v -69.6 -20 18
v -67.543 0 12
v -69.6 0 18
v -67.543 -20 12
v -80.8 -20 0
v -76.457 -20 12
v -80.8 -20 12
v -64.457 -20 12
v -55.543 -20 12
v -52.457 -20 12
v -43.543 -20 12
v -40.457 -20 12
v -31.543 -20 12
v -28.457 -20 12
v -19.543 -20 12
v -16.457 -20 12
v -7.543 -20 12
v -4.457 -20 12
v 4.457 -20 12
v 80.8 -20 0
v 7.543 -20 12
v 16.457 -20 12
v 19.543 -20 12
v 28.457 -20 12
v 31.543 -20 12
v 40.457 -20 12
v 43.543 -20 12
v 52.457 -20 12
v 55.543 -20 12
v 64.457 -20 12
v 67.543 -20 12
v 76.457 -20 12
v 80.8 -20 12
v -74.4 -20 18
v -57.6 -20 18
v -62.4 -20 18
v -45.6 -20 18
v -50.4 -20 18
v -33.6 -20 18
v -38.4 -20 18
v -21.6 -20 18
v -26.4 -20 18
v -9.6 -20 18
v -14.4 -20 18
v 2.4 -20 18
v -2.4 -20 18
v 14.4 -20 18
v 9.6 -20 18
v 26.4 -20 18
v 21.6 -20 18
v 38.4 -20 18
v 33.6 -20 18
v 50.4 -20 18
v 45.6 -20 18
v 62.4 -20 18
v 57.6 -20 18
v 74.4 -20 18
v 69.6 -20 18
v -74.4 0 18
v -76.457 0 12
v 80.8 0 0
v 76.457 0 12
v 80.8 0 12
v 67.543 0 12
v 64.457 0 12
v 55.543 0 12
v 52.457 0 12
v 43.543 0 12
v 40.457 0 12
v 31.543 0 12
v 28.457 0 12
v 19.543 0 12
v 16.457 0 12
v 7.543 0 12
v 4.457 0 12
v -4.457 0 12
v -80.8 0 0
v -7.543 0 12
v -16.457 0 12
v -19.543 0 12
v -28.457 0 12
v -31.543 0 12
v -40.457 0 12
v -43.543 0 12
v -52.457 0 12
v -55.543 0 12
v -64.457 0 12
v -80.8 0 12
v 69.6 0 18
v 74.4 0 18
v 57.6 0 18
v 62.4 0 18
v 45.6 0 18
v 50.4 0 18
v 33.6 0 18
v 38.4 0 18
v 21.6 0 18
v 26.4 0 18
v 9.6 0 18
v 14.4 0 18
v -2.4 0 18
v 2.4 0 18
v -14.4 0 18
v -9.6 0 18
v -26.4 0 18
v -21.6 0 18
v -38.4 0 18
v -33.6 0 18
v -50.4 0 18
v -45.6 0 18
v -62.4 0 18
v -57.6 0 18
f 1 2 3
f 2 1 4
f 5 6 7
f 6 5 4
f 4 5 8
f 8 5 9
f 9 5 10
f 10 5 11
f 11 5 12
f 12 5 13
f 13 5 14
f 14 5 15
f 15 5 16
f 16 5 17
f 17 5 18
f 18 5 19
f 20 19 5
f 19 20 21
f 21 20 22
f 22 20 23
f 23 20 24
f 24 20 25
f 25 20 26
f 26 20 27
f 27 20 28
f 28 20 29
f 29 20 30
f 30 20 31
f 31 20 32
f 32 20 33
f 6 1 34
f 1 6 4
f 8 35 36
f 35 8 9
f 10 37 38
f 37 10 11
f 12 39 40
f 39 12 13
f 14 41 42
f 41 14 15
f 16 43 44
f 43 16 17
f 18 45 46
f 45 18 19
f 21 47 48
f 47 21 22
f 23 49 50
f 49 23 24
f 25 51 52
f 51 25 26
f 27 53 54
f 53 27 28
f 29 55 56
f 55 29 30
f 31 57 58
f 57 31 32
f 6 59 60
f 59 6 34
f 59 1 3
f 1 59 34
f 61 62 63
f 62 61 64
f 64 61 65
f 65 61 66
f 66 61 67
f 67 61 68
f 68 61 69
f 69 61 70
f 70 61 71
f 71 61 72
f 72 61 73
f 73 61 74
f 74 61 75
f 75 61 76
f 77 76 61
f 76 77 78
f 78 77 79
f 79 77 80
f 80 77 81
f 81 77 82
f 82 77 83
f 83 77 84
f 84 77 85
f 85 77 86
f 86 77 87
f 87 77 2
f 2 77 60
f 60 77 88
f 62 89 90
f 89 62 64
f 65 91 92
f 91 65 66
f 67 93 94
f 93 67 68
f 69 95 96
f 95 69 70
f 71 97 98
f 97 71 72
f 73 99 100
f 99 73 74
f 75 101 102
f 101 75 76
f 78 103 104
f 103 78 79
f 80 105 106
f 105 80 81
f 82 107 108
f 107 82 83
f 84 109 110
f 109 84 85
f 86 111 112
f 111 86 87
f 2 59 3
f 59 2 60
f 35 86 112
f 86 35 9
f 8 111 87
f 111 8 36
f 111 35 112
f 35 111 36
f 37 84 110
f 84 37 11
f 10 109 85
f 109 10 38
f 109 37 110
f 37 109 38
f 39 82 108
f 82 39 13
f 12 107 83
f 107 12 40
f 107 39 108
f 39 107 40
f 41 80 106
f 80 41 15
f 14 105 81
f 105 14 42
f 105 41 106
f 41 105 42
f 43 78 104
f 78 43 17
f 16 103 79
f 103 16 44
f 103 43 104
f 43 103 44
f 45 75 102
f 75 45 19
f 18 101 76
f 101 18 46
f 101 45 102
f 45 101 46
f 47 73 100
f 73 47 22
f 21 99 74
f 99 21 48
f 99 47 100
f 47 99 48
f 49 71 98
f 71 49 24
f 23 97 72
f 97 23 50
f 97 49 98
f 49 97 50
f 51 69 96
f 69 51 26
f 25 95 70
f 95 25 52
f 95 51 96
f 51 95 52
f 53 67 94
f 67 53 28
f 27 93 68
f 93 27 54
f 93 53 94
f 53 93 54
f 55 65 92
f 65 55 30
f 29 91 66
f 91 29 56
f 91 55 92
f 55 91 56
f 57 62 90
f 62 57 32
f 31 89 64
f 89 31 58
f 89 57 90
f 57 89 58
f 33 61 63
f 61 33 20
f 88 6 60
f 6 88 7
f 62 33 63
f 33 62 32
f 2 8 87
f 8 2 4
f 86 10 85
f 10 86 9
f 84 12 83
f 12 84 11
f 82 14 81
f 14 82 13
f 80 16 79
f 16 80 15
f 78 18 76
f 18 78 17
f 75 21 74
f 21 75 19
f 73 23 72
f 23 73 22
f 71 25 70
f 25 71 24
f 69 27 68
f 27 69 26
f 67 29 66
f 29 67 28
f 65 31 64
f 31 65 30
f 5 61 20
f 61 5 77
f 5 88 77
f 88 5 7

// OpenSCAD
$fn = 32;

// ----------------------------------------------------------------------
// Toothed rack, 13 teeth
// 12 mm pitch, 6 mm teeth
// ----------------------------------------------------------------------

// --- parameters (mm) ---
bar_w = 20;     // bar width (Y)
bar_h = 12;     // bar height (Z)
teeth = 13;     // number of teeth
pitch = 12;     // tooth pitch
tooth_h = 6;    // tooth height above the bar
root_w = 9.6;   // tooth width at the root
crest_w = 4.8;  // tooth width at the crest

// --- derived feature positions (mm) ---
span = (teeth - 1) * pitch;  // = 144   distance between the outer teeth
bar_l = span + root_w + 8;   // = 161.6   bar length: teeth plus 4 mm at each end
tooth_x = -span / 2;         // = -72   X of the first tooth
height = bar_h + tooth_h;    // = 18   overall height
feature_centers = [
  [tooth_x + 0 * pitch, -bar_w / 2],
  [tooth_x + 1 * pitch, -bar_w / 2],
  [tooth_x + 2 * pitch, -bar_w / 2],
  [tooth_x + 3 * pitch, -bar_w / 2],
  [tooth_x + 4 * pitch, -bar_w / 2],
  [tooth_x + 5 * pitch, -bar_w / 2],
  [tooth_x + 6 * pitch, -bar_w / 2],
  [tooth_x + 7 * pitch, -bar_w / 2],
  [tooth_x + 8 * pitch, -bar_w / 2],
  [tooth_x + 9 * pitch, -bar_w / 2],
  [tooth_x + 10 * pitch, -bar_w / 2],
  [tooth_x + 11 * pitch, -bar_w / 2],
  [tooth_x + 12 * pitch, -bar_w / 2]
];   // tooth centre line, drives the tooth loop

// bar with a rack of teeth, one extruded trapezoium per centre
module rack_tooth() {
  linear_extrude(height = bar_w)
    polygon(points = [
      [0, 0],
      [root_w, 0],
      [root_w / 2 + crest_w / 2, tooth_h + 1],
      [root_w / 2 - crest_w / 2, tooth_h + 1]
    ]);
}

union() {
  translate([-bar_l / 2, -bar_w, 0]) cube([bar_l, bar_w, bar_h]);
  for (centre = feature_centers)
    translate([centre[0] - root_w / 2, 0, bar_h - 1]) rotate([90, 0, 0]) rack_tooth();
}
